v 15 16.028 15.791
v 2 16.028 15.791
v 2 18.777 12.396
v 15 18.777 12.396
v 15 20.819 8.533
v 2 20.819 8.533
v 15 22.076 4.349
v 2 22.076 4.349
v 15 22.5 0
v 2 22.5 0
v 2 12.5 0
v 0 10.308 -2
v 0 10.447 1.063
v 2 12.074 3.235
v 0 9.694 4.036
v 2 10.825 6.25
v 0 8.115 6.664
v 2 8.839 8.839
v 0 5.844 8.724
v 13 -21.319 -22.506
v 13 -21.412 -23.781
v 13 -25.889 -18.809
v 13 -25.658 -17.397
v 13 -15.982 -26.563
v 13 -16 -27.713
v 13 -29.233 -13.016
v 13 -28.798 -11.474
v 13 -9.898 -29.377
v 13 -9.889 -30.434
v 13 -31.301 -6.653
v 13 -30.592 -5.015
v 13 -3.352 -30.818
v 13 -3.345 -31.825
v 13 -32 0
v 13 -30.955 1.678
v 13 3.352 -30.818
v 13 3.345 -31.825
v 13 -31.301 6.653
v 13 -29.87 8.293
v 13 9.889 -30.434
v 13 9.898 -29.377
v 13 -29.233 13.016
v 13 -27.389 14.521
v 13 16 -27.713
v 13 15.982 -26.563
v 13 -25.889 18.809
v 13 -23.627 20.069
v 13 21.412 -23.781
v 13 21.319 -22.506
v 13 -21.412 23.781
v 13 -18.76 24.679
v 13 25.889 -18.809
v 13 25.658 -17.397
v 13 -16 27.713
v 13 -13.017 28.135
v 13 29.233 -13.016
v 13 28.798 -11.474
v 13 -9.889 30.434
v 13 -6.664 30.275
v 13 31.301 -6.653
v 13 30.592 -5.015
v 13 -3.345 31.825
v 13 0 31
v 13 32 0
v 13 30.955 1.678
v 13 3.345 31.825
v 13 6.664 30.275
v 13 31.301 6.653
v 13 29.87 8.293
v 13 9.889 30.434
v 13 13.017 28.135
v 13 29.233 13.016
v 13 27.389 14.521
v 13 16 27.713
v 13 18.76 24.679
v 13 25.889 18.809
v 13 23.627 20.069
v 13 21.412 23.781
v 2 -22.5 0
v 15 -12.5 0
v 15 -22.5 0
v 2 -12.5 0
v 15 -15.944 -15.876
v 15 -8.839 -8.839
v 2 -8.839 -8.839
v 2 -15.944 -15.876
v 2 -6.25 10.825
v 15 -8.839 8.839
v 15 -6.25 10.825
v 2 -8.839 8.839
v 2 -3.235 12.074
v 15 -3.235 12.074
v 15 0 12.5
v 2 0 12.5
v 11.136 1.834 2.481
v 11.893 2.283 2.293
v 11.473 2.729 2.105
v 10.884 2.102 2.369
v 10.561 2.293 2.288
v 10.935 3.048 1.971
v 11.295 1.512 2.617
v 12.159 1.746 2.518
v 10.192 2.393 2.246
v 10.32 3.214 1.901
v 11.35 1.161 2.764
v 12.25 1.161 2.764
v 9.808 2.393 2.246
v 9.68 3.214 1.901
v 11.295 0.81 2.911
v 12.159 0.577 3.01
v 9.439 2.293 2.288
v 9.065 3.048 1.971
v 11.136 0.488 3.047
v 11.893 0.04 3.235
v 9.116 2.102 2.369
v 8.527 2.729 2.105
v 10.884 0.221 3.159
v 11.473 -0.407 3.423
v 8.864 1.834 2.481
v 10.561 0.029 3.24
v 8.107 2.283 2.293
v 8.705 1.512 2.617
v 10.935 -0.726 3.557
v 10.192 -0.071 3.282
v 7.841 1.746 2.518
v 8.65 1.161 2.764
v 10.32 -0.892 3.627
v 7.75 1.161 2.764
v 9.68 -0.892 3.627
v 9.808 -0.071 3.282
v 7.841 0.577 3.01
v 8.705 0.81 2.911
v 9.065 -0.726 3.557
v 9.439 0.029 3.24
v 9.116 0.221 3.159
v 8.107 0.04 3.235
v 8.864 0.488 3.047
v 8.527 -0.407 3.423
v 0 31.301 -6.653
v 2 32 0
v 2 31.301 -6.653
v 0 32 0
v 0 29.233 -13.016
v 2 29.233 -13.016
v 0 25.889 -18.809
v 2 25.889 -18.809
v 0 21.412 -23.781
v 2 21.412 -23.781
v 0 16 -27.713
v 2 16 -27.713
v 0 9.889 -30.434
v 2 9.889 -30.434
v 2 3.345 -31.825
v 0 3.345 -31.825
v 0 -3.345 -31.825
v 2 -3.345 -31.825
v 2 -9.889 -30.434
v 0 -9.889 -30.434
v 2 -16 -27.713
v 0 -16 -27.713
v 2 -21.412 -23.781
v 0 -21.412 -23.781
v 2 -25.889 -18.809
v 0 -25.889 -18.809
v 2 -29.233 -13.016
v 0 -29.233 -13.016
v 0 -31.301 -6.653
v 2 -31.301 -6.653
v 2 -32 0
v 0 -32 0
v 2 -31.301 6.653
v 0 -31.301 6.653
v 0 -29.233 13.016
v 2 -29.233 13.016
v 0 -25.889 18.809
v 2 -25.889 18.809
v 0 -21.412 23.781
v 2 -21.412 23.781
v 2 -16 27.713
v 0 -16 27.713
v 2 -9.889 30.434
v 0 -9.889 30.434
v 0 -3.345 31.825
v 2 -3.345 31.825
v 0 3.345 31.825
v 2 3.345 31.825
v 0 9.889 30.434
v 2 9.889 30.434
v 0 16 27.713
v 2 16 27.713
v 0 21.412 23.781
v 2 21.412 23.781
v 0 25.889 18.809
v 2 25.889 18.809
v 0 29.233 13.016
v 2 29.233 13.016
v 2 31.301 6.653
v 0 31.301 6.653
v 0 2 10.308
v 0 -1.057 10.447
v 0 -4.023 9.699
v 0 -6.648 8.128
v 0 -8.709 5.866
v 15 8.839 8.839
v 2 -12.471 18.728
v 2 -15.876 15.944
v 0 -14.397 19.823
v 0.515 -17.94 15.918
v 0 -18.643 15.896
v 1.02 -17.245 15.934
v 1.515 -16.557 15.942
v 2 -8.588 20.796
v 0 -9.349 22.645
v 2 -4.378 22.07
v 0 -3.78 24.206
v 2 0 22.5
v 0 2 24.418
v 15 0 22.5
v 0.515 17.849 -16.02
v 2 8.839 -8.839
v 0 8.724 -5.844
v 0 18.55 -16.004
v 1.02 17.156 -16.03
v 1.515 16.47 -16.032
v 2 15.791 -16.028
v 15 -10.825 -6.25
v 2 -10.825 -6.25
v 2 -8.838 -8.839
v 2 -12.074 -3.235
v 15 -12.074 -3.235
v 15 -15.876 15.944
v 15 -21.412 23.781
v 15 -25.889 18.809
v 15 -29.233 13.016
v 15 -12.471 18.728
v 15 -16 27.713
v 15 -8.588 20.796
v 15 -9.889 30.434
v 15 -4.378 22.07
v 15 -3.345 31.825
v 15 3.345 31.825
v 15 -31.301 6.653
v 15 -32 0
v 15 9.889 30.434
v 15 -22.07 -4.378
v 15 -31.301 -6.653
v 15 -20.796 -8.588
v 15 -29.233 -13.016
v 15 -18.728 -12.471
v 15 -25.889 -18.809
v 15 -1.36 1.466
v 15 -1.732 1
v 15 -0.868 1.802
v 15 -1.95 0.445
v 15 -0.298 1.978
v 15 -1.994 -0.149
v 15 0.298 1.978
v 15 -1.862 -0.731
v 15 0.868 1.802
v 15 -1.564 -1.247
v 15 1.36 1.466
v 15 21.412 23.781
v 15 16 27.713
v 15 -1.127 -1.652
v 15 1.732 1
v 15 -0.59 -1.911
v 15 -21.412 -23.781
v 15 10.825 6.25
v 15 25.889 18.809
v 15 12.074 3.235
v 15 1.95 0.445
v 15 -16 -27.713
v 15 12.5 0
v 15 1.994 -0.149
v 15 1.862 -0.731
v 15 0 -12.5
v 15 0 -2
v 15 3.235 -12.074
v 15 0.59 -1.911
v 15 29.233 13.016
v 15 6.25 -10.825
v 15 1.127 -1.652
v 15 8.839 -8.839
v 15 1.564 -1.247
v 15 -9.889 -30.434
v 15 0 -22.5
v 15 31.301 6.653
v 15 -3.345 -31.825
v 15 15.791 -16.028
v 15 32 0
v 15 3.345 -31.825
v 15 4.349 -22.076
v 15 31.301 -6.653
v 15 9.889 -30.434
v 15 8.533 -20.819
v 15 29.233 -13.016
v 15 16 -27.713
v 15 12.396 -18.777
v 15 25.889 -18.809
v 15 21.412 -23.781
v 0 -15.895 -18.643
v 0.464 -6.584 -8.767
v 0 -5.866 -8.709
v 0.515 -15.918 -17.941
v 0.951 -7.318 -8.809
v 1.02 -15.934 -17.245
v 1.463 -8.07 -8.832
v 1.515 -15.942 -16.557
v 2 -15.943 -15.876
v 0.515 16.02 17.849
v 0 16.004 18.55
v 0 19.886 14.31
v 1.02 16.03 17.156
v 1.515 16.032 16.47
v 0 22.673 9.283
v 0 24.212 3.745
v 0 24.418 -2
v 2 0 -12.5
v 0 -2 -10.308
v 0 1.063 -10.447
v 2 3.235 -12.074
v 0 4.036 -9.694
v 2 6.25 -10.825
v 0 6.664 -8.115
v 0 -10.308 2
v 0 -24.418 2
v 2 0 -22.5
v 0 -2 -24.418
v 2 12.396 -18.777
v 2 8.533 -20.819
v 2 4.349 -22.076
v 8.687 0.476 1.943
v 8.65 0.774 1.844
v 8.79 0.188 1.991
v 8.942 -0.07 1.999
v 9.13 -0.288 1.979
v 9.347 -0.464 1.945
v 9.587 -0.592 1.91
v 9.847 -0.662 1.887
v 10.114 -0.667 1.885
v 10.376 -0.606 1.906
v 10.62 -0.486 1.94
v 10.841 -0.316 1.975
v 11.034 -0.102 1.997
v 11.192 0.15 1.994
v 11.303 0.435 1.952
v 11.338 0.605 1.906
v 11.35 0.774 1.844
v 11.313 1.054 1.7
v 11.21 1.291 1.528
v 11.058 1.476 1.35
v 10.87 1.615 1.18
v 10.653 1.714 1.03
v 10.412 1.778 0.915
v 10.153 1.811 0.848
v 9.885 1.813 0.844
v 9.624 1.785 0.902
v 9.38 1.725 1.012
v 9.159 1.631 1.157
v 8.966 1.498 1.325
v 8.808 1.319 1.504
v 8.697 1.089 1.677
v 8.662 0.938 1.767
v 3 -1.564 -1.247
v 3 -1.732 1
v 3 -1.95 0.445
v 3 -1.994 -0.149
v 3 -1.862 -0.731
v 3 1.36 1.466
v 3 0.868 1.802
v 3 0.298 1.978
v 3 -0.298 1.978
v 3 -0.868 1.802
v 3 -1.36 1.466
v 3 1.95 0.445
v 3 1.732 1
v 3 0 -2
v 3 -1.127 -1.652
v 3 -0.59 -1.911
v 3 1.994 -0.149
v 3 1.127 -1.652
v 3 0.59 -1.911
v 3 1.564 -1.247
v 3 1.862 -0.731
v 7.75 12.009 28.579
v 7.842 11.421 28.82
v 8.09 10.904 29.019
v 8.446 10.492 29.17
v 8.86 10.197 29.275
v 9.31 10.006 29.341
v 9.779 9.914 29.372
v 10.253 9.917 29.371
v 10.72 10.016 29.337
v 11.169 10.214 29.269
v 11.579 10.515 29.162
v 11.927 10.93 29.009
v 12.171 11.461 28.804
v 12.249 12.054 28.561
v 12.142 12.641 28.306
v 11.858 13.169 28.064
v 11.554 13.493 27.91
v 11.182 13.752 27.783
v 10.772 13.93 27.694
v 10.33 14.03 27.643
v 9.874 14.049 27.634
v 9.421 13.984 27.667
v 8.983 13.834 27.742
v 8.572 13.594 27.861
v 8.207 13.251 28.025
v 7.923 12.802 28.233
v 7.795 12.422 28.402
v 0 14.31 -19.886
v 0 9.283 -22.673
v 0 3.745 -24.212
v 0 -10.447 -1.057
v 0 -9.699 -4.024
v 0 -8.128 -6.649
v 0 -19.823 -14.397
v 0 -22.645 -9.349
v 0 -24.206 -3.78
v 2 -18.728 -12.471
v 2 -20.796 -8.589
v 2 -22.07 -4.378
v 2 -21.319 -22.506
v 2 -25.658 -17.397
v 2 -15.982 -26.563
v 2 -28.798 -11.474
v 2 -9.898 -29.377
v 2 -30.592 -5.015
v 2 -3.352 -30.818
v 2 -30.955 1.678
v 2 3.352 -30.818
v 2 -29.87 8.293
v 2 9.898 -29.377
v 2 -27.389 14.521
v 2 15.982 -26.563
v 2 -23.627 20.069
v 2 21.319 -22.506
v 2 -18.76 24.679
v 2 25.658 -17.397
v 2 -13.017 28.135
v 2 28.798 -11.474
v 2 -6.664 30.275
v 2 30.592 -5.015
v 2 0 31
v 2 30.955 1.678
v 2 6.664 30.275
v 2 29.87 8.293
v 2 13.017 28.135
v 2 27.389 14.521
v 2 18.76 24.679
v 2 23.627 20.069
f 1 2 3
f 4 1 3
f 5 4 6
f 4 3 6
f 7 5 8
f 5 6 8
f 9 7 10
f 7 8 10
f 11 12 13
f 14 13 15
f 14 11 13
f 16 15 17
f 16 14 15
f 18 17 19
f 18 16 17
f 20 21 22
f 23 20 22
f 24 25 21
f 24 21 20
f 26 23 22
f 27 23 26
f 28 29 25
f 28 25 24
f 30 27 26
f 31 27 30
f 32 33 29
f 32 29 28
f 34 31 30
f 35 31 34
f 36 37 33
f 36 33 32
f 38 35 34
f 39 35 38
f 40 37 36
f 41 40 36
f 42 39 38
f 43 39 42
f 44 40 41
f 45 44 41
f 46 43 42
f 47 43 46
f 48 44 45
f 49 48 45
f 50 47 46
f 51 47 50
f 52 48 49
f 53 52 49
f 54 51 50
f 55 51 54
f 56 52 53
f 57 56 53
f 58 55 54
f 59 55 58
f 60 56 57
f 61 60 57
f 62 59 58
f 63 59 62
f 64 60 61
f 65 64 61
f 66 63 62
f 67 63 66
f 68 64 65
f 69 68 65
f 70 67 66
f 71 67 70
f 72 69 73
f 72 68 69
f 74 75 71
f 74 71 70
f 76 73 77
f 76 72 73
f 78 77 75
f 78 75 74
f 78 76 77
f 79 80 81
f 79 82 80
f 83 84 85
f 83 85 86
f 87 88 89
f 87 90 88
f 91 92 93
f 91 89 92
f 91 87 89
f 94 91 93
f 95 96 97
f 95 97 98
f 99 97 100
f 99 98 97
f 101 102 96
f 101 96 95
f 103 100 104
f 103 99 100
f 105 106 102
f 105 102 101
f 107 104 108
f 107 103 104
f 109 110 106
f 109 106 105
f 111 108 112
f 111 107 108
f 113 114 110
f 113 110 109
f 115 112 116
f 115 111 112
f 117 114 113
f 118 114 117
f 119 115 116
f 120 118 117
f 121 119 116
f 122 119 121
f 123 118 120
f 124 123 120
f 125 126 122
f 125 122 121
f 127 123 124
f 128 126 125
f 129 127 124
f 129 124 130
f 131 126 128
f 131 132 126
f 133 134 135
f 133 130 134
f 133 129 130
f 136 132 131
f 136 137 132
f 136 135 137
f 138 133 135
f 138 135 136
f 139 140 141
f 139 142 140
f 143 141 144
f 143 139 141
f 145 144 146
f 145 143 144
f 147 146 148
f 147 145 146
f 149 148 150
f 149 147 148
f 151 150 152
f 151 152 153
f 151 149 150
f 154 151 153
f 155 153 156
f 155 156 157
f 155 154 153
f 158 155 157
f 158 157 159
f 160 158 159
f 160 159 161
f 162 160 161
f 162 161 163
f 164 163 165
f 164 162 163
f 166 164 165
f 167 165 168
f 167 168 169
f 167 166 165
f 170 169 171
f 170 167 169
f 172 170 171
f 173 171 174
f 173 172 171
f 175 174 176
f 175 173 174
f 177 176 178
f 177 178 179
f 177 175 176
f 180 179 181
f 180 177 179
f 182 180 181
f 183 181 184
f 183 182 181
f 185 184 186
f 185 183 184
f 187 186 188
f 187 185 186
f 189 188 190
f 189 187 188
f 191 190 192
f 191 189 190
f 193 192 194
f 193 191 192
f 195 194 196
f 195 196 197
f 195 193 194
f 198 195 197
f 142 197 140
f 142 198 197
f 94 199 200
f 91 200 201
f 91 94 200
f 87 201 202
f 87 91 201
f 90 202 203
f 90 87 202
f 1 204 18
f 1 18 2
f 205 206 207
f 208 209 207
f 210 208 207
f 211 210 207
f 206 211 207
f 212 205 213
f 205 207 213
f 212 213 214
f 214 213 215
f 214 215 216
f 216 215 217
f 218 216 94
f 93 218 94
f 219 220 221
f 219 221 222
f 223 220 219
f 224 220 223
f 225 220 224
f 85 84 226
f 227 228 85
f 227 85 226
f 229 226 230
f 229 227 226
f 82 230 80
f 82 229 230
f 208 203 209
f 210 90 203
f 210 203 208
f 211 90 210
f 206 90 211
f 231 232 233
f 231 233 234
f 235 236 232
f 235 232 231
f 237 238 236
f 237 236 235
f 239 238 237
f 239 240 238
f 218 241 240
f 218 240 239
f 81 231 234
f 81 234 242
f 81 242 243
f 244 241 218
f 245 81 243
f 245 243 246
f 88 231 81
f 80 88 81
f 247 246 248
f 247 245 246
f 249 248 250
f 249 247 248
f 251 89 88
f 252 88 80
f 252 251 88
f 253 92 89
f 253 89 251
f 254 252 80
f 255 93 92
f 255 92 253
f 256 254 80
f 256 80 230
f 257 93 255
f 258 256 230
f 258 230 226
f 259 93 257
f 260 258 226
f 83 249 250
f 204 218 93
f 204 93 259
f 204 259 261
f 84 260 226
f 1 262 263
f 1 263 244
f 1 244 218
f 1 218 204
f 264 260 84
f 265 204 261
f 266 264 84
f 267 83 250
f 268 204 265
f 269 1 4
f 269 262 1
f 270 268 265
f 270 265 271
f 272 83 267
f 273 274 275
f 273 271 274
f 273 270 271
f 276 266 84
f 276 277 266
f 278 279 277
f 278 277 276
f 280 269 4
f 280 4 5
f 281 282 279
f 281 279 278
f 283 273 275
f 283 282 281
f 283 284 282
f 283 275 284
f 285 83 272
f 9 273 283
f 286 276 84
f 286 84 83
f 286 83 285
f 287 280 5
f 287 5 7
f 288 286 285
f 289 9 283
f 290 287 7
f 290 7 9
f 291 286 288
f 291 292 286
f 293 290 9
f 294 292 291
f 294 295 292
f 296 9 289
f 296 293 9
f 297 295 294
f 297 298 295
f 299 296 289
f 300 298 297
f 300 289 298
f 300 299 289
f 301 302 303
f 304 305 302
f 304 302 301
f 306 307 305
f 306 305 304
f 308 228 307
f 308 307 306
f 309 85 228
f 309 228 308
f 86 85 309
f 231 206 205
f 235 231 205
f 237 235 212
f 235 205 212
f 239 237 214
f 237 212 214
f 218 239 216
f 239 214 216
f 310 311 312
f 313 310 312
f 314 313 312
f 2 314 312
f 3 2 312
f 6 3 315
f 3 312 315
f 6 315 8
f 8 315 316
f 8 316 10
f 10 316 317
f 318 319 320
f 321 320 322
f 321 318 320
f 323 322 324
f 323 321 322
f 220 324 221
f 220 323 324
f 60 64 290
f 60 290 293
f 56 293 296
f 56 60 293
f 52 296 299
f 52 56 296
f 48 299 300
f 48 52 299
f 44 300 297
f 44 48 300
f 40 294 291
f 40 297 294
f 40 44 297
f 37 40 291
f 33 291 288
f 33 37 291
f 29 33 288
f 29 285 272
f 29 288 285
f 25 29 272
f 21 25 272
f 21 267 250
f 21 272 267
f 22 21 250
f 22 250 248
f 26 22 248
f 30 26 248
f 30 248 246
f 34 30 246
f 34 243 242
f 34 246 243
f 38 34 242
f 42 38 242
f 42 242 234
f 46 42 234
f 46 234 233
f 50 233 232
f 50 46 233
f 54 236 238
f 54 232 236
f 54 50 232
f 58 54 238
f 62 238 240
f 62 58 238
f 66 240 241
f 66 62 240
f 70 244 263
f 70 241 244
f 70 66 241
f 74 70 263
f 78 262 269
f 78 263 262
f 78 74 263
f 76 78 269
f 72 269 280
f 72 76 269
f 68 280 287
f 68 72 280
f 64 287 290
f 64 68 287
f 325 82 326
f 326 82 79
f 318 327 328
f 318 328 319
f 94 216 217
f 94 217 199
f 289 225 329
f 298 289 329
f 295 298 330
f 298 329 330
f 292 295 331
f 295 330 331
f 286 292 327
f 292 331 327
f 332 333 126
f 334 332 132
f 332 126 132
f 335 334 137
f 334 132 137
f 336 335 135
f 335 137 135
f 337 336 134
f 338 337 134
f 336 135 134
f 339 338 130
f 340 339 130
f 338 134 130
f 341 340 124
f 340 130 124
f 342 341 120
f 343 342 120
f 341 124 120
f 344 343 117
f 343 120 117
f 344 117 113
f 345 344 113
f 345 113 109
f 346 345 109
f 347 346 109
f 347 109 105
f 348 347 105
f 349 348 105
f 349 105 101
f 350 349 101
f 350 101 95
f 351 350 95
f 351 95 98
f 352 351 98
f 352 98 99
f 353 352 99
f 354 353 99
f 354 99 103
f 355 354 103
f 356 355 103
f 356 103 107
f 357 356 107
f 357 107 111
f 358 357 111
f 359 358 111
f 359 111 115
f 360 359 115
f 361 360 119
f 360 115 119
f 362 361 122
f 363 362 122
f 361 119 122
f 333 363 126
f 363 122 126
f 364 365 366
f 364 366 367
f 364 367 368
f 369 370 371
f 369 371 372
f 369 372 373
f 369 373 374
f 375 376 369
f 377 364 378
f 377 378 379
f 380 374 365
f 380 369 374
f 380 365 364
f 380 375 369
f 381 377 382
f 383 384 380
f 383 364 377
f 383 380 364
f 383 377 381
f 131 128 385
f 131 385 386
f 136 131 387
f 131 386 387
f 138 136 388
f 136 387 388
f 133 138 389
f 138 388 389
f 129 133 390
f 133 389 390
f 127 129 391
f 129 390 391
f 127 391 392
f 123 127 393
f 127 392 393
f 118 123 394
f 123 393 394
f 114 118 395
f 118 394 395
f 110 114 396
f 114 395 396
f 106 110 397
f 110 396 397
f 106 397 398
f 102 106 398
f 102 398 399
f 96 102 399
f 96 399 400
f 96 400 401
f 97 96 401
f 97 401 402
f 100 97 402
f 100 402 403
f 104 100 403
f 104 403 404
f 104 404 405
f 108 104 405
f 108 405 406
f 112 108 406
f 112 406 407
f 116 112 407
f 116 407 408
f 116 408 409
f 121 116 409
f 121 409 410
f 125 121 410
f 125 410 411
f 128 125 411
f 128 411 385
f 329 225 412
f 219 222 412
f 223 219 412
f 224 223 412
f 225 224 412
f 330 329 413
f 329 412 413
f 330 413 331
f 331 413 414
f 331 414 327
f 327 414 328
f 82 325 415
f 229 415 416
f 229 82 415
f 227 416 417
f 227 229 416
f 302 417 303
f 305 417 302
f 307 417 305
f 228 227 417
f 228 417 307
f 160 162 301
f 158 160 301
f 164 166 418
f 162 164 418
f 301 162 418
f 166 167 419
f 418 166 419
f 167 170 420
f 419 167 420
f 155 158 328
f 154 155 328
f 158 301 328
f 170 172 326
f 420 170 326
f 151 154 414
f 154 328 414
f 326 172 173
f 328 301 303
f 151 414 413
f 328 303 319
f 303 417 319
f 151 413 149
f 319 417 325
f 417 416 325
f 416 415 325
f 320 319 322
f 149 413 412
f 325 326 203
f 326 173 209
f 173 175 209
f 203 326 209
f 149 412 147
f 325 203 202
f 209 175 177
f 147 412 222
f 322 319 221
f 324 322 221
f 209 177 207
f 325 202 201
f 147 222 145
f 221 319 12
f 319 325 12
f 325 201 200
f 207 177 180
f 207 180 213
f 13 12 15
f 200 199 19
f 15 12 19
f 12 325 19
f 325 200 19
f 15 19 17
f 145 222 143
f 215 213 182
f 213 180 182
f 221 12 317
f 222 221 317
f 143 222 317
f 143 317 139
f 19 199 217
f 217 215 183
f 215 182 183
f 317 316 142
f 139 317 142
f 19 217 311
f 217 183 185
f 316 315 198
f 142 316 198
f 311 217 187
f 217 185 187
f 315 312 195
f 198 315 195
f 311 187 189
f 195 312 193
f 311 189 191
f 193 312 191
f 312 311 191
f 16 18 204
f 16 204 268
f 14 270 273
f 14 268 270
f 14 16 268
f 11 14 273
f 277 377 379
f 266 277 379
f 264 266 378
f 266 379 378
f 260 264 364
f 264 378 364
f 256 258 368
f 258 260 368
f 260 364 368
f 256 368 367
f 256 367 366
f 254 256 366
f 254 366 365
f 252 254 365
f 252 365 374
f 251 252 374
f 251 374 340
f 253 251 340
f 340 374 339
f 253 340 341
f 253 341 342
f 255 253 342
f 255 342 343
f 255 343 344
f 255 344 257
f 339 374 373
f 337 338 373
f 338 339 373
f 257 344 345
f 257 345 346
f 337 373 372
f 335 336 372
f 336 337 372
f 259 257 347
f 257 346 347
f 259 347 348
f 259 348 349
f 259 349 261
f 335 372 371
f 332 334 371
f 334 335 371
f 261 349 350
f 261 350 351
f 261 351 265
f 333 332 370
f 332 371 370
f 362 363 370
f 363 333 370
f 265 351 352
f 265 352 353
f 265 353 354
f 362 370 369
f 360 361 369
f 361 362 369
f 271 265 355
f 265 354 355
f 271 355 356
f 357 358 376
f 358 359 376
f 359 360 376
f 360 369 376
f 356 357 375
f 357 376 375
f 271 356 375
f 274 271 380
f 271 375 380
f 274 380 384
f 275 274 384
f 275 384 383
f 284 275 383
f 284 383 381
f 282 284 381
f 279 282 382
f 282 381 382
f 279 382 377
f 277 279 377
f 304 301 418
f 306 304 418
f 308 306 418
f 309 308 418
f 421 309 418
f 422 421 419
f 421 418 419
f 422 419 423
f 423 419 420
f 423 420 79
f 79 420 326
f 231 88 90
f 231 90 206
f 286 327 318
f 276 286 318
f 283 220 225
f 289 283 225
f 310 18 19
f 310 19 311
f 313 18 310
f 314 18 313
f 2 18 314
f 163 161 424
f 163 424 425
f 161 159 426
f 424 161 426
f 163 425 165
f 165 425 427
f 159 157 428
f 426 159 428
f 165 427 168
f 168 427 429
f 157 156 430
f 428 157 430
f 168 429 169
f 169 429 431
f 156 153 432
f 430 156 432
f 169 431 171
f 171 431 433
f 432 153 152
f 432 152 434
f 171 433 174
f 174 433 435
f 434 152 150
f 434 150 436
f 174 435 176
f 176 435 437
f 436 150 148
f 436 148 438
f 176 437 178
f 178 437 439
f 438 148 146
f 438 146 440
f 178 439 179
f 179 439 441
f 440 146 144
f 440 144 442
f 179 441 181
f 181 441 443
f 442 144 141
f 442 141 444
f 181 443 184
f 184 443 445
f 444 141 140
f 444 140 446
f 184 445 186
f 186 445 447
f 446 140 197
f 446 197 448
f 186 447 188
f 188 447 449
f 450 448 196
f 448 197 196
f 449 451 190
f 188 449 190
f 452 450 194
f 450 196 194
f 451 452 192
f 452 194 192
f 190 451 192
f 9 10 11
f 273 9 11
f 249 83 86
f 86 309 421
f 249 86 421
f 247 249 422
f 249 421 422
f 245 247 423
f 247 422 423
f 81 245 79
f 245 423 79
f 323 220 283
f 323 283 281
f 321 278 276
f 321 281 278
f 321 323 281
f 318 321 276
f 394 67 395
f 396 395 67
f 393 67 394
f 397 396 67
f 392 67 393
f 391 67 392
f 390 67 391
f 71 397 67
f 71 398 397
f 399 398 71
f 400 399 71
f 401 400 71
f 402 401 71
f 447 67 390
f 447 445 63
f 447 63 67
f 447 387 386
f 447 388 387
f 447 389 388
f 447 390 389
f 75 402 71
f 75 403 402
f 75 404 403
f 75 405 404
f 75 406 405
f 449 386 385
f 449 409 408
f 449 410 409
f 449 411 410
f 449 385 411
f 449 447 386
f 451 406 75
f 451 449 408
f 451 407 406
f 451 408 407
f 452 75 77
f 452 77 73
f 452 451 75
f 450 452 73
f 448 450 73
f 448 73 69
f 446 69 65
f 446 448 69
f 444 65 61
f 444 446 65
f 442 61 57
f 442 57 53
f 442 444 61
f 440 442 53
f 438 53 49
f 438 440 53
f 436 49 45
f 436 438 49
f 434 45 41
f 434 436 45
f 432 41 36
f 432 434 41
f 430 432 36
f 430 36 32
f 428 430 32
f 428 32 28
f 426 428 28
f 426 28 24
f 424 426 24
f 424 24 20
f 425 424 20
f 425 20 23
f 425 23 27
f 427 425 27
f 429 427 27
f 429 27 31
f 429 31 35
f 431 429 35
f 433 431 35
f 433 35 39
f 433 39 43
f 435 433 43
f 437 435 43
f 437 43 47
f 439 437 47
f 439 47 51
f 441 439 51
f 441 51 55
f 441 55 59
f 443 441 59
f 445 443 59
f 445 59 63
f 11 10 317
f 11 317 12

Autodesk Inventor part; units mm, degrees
ref_plane "XZ Plane" through (0, 0, 0) normal (0, 1, 0) x (-1, 0, 0)
ref_plane "XY Plane" through (0, 0, 0) normal (0, 0, 1) x (1, 0, 0)
sketch "Эскиз1" plane through (0, 0, 0) normal (1, 0, 0) x (0, 1, 0)
  circle A0 centre (0, 0) radius 33
  circle A1 centre (0, 0) radius 27.5
  line L0 (27.5, 0) -> (12.5, 0)
  line L1 (0, 27.5) -> (0, 12.5)
  arc A2 (0, -12.5) -> (12.5, 0) centre (0, 0) ccw
  arc A3 (-12.5, 0) -> (0, -12.5) centre (0, 0) ccw
  arc A4 (0, 12.5) -> (-12.5, 0) centre (0, 0) ccw
  arc A5 (12.5, 0) -> (0, 12.5) centre (0, 0) ccw
  line L2 (27.5, 0) -> (22.5, 0)
  line L3 (0, -27.5) -> (0, -22.5)
  line L4 (27.5, 0) -> (22.5, 0)
  line L5 (0, 27.5) -> (0, 22.5)
  line L6 (-27.5, 0) -> (-22.5, 0)
  circle A6 centre (0, 0) radius 22.5
  line L7 (-8.8388, -8.8388) -> (-15.9436, -15.8761)
  line L8 (-12.5, 0) -> (-22.5, 0)
  line L9 (-8.8388, 8.8388) -> (-15.8761, 15.9436)
  line L10 (8.8388, 8.8388) -> (16.0277, 15.7912)
  line L11 (12.5, 0) -> (22.5, 0)
  line L12 (0, 12.5) -> (0, 22.5)
  line L13 (8.8388, -8.8388) -> (15.7912, -16.0277)
  line L14 (0, -22.5) -> (0, -12.5)
  circle A7 centre (0, 0) radius 27.5
  circle A8 centre (0, 0) radius 32
  point P0 (-27.5, 0)
  point P1 (0, 22.5)
  point P2 (0, 22.5)
  point P3 (-22.5, 0)
  point P4 (-22.5, 0)
  dimension "d2" = 15
  dimension "d3" = 15
  dimension "d4" = 15
  dimension "d5" = 15
  dimension "d21" = 5
  dimension "d22" = 5
  dimension "d25" = 360
  dimension "d67" = 64
extrude "Выдавливание1" add sketch "Эскиз1" along normal blind 15 contours L0 A6 L1 A1 | A1 L3 A6 L0 | L1 A6 L6 A1 | A1 L6 A6 L3 | A6 L13 A2 L0 | L0 A5 L10 A6 | A6 L10 A5 L1 | L1 A4 L9 A6 | L14 A2 L13 A6 | A6 L7 A3 L14 | A2 A3 A4 A5 | L8 A3 L7 A6 | A6 L9 A4 L8 | A8
sketch "Эскиз5" plane through (15, 0, 0) normal (1, 0, 0) x (0, 0, -1)
  point P0 (0, 0)
extrude "Выдавливание3" cut sketch "Эскиз1" along normal blind 15 contours L0 A5 L10 A6 | L1 A4 L9 A6 | L14 A2 L13 A6 | L8 A3 L7 A6
sketch "Эскиз6" plane through (15, 0, 0) normal (1, 0, 0) x (0, 0, -1)
  circle A0 centre (0, 0) radius 11.25
  arc A1 (0, 12.5) -> (-8.8388, 8.8388) centre (0, 0) ccw projected
  arc A2 (0, 12.5) -> (-8.8388, 8.8388) centre (0, 0) ccw
  line L0 (0, 0) -> (-3.0615, 7.391) construction
  circle A3 centre (-3.0615, 7.391) radius 1.5
  circle A4 centre (-7.391, -3.0615) radius 1.5
  circle A5 centre (3.0615, -7.391) radius 1.5
  circle A6 centre (7.391, 3.0615) radius 1.5
  arc A7 (-3.0615, 7.391) -> (-7.391, -3.0615) centre (0, 0) ccw
  line L1 (-8.8388, 8.8388) -> (-22.3952, 22.8573) construction
  circle A8 centre (0, 0) radius 32 construction
  line L2 (-8.8388, 8.8388) -> (10.6622, 8.8388) construction
  arc A9 (-22.3952, 22.8573) -> (-32, 0) centre (0, 0) ccw construction
  line L3 (-29.5012, 12.3966) -> (-7.391, 3.0615)
  dimension "d31" = 22.5
  dimension "d72" = 8
  dimension "d74" = 3
  dimension "d77" = 360
  dimension "d79" = 134.04
extrude "Выдавливание4" [suppressed]
extrude "Выдавливание5" cut sketch "Эскиз6" against normal blind 12 contours A3 | A4 | A0 | A5 | A6
extrude "Выдавливание6" [suppressed]
chamfer "Фаска2" distance 2 angle 45 1 edges at (0, -12.3912, -12.3575)
chamfer "Фаска3" distance 2 angle 45 15 edges at (0, -20.7964, -8.5883) (0, -17.5, 0) (0, -11.5485, -4.7835) (0, 0, -17.5) (0, 8.5331, -20.8191) (0, 12.315, -12.4333) (0, 4.7835, -11.5485) (0, 17.5, 0) (0, 11.5485, 4.7835) (0, 20.8191, 8.5331) (0, 12.4333, 12.315) (0, 0, 17.5) (0, -4.7835, 11.5485) (0, -12.3575, 12.3912) (0, -8.5883, 20.7964)
ref_plane "РабПлоскость3" through (2, 0, 0) normal (1, 0, 0) x (0, 1, 0)
sketch "Эскиз10" plane through (2, 0, 0) normal (1, 0, 0) x (0, 1, 0)
  circle A0 centre (0, 0) radius 26.5
  circle A1 centre (0, 0) radius 27.5 projected
  circle A2 centre (0, 0) radius 26.5
  dimension "d66" = 53
sketch "Эскиз11" plane through (0, 0, 0) normal (-1, 0, 0) x (0, 0, 1)
  circle A0 centre (0, 0) radius 31
  circle A1 centre (0, 0) radius 32
  dimension "d68" = 62
extrude "Выдавливание9" cut sketch "Эскиз11" against normal blind 11 from surface at -2
sketch "Эскиз12" plane through (15, 0, 0) normal (1, 0, 0) x (0, 0, -1)
  circle A0 centre (0, 0) radius 32 projected
  arc A1 (0, 12.5) -> (-8.8388, 8.8388) centre (0, 0) ccw projected
  line L0 (-8.8388, 8.8388) -> (-22.3952, 22.8573)
  circle A2 centre (0, 0) radius 32 projected
  line L1 (-8.8388, 8.8388) -> (10.6622, 8.8388) construction
  point P0 (0, 0)
  point P1 (-32, 0)
  dimension "d85" = 134.04
ref_plane "РабПлоскость4" through (15, 12.3966, 29.5012) normal (0, 0.3874, 0.9219) x (-1, 0, 0)
sketch "Эскиз14" plane through (15, 12.3966, 29.5012) normal (0, 0.3874, 0.9219) x (-1, 0, 0)
  line L0 (0, -11.25) -> (0, 11.25) projected
  line L1 (0, 0) -> (5, 0)
  circle A0 centre (5, 0) radius 2.25
  circle A1 centre (5, 0) radius 1.35
  point P0 (15, 0)
  point P1 (8, 0)
  dimension "d95" = 5
  dimension "d96" = 4.5
  dimension "d99" = 2.7
extrude "Выдавливание11" [suppressed]
sketch "Эскиз15" plane through (3, 0, 0) normal (1, 0, 0) x (0, 0, -1)
  circle A0 centre (0, 0) radius 2
  dimension "d90" = 4
sketch "Эскиз16" plane through (3, 0, 0) normal (1, 0, 0) x (0, 0, -1)
  circle A0 centre (0, 0) radius 3.5
  circle A1 centre (0, 0) radius 2
  dimension "d91" = 7
  dimension "d92" = 4
extrude "Выдавливание12" add sketch "Эскиз16" along normal blind 12
ref_plane "РабПлоскость6" through (15, 1.3559, 3.2267) normal (0, 0.3874, 0.9219) x (-1, 0, 0)
extrude "Выдавливание14" cut sketch "Эскиз14" against normal blind 4 from surface at -28.5 contours A1
sketch "Эскиз18" plane through (15, 0, 0) normal (1, 0, 0) x (0, 0, -1)
  circle A0 centre (0, 0) radius 3.5 projected
  circle A1 centre (0, 0) radius 3.5
  circle A2 centre (0, 0) radius 11.25
extrude "Выдавливание15" add sketch "Эскиз18" against normal blind 12
extrude "Выдавливание16" cut sketch "Эскиз14" against normal blind 29 contours A1 | A0
properties part number "колеса прототип 1"
